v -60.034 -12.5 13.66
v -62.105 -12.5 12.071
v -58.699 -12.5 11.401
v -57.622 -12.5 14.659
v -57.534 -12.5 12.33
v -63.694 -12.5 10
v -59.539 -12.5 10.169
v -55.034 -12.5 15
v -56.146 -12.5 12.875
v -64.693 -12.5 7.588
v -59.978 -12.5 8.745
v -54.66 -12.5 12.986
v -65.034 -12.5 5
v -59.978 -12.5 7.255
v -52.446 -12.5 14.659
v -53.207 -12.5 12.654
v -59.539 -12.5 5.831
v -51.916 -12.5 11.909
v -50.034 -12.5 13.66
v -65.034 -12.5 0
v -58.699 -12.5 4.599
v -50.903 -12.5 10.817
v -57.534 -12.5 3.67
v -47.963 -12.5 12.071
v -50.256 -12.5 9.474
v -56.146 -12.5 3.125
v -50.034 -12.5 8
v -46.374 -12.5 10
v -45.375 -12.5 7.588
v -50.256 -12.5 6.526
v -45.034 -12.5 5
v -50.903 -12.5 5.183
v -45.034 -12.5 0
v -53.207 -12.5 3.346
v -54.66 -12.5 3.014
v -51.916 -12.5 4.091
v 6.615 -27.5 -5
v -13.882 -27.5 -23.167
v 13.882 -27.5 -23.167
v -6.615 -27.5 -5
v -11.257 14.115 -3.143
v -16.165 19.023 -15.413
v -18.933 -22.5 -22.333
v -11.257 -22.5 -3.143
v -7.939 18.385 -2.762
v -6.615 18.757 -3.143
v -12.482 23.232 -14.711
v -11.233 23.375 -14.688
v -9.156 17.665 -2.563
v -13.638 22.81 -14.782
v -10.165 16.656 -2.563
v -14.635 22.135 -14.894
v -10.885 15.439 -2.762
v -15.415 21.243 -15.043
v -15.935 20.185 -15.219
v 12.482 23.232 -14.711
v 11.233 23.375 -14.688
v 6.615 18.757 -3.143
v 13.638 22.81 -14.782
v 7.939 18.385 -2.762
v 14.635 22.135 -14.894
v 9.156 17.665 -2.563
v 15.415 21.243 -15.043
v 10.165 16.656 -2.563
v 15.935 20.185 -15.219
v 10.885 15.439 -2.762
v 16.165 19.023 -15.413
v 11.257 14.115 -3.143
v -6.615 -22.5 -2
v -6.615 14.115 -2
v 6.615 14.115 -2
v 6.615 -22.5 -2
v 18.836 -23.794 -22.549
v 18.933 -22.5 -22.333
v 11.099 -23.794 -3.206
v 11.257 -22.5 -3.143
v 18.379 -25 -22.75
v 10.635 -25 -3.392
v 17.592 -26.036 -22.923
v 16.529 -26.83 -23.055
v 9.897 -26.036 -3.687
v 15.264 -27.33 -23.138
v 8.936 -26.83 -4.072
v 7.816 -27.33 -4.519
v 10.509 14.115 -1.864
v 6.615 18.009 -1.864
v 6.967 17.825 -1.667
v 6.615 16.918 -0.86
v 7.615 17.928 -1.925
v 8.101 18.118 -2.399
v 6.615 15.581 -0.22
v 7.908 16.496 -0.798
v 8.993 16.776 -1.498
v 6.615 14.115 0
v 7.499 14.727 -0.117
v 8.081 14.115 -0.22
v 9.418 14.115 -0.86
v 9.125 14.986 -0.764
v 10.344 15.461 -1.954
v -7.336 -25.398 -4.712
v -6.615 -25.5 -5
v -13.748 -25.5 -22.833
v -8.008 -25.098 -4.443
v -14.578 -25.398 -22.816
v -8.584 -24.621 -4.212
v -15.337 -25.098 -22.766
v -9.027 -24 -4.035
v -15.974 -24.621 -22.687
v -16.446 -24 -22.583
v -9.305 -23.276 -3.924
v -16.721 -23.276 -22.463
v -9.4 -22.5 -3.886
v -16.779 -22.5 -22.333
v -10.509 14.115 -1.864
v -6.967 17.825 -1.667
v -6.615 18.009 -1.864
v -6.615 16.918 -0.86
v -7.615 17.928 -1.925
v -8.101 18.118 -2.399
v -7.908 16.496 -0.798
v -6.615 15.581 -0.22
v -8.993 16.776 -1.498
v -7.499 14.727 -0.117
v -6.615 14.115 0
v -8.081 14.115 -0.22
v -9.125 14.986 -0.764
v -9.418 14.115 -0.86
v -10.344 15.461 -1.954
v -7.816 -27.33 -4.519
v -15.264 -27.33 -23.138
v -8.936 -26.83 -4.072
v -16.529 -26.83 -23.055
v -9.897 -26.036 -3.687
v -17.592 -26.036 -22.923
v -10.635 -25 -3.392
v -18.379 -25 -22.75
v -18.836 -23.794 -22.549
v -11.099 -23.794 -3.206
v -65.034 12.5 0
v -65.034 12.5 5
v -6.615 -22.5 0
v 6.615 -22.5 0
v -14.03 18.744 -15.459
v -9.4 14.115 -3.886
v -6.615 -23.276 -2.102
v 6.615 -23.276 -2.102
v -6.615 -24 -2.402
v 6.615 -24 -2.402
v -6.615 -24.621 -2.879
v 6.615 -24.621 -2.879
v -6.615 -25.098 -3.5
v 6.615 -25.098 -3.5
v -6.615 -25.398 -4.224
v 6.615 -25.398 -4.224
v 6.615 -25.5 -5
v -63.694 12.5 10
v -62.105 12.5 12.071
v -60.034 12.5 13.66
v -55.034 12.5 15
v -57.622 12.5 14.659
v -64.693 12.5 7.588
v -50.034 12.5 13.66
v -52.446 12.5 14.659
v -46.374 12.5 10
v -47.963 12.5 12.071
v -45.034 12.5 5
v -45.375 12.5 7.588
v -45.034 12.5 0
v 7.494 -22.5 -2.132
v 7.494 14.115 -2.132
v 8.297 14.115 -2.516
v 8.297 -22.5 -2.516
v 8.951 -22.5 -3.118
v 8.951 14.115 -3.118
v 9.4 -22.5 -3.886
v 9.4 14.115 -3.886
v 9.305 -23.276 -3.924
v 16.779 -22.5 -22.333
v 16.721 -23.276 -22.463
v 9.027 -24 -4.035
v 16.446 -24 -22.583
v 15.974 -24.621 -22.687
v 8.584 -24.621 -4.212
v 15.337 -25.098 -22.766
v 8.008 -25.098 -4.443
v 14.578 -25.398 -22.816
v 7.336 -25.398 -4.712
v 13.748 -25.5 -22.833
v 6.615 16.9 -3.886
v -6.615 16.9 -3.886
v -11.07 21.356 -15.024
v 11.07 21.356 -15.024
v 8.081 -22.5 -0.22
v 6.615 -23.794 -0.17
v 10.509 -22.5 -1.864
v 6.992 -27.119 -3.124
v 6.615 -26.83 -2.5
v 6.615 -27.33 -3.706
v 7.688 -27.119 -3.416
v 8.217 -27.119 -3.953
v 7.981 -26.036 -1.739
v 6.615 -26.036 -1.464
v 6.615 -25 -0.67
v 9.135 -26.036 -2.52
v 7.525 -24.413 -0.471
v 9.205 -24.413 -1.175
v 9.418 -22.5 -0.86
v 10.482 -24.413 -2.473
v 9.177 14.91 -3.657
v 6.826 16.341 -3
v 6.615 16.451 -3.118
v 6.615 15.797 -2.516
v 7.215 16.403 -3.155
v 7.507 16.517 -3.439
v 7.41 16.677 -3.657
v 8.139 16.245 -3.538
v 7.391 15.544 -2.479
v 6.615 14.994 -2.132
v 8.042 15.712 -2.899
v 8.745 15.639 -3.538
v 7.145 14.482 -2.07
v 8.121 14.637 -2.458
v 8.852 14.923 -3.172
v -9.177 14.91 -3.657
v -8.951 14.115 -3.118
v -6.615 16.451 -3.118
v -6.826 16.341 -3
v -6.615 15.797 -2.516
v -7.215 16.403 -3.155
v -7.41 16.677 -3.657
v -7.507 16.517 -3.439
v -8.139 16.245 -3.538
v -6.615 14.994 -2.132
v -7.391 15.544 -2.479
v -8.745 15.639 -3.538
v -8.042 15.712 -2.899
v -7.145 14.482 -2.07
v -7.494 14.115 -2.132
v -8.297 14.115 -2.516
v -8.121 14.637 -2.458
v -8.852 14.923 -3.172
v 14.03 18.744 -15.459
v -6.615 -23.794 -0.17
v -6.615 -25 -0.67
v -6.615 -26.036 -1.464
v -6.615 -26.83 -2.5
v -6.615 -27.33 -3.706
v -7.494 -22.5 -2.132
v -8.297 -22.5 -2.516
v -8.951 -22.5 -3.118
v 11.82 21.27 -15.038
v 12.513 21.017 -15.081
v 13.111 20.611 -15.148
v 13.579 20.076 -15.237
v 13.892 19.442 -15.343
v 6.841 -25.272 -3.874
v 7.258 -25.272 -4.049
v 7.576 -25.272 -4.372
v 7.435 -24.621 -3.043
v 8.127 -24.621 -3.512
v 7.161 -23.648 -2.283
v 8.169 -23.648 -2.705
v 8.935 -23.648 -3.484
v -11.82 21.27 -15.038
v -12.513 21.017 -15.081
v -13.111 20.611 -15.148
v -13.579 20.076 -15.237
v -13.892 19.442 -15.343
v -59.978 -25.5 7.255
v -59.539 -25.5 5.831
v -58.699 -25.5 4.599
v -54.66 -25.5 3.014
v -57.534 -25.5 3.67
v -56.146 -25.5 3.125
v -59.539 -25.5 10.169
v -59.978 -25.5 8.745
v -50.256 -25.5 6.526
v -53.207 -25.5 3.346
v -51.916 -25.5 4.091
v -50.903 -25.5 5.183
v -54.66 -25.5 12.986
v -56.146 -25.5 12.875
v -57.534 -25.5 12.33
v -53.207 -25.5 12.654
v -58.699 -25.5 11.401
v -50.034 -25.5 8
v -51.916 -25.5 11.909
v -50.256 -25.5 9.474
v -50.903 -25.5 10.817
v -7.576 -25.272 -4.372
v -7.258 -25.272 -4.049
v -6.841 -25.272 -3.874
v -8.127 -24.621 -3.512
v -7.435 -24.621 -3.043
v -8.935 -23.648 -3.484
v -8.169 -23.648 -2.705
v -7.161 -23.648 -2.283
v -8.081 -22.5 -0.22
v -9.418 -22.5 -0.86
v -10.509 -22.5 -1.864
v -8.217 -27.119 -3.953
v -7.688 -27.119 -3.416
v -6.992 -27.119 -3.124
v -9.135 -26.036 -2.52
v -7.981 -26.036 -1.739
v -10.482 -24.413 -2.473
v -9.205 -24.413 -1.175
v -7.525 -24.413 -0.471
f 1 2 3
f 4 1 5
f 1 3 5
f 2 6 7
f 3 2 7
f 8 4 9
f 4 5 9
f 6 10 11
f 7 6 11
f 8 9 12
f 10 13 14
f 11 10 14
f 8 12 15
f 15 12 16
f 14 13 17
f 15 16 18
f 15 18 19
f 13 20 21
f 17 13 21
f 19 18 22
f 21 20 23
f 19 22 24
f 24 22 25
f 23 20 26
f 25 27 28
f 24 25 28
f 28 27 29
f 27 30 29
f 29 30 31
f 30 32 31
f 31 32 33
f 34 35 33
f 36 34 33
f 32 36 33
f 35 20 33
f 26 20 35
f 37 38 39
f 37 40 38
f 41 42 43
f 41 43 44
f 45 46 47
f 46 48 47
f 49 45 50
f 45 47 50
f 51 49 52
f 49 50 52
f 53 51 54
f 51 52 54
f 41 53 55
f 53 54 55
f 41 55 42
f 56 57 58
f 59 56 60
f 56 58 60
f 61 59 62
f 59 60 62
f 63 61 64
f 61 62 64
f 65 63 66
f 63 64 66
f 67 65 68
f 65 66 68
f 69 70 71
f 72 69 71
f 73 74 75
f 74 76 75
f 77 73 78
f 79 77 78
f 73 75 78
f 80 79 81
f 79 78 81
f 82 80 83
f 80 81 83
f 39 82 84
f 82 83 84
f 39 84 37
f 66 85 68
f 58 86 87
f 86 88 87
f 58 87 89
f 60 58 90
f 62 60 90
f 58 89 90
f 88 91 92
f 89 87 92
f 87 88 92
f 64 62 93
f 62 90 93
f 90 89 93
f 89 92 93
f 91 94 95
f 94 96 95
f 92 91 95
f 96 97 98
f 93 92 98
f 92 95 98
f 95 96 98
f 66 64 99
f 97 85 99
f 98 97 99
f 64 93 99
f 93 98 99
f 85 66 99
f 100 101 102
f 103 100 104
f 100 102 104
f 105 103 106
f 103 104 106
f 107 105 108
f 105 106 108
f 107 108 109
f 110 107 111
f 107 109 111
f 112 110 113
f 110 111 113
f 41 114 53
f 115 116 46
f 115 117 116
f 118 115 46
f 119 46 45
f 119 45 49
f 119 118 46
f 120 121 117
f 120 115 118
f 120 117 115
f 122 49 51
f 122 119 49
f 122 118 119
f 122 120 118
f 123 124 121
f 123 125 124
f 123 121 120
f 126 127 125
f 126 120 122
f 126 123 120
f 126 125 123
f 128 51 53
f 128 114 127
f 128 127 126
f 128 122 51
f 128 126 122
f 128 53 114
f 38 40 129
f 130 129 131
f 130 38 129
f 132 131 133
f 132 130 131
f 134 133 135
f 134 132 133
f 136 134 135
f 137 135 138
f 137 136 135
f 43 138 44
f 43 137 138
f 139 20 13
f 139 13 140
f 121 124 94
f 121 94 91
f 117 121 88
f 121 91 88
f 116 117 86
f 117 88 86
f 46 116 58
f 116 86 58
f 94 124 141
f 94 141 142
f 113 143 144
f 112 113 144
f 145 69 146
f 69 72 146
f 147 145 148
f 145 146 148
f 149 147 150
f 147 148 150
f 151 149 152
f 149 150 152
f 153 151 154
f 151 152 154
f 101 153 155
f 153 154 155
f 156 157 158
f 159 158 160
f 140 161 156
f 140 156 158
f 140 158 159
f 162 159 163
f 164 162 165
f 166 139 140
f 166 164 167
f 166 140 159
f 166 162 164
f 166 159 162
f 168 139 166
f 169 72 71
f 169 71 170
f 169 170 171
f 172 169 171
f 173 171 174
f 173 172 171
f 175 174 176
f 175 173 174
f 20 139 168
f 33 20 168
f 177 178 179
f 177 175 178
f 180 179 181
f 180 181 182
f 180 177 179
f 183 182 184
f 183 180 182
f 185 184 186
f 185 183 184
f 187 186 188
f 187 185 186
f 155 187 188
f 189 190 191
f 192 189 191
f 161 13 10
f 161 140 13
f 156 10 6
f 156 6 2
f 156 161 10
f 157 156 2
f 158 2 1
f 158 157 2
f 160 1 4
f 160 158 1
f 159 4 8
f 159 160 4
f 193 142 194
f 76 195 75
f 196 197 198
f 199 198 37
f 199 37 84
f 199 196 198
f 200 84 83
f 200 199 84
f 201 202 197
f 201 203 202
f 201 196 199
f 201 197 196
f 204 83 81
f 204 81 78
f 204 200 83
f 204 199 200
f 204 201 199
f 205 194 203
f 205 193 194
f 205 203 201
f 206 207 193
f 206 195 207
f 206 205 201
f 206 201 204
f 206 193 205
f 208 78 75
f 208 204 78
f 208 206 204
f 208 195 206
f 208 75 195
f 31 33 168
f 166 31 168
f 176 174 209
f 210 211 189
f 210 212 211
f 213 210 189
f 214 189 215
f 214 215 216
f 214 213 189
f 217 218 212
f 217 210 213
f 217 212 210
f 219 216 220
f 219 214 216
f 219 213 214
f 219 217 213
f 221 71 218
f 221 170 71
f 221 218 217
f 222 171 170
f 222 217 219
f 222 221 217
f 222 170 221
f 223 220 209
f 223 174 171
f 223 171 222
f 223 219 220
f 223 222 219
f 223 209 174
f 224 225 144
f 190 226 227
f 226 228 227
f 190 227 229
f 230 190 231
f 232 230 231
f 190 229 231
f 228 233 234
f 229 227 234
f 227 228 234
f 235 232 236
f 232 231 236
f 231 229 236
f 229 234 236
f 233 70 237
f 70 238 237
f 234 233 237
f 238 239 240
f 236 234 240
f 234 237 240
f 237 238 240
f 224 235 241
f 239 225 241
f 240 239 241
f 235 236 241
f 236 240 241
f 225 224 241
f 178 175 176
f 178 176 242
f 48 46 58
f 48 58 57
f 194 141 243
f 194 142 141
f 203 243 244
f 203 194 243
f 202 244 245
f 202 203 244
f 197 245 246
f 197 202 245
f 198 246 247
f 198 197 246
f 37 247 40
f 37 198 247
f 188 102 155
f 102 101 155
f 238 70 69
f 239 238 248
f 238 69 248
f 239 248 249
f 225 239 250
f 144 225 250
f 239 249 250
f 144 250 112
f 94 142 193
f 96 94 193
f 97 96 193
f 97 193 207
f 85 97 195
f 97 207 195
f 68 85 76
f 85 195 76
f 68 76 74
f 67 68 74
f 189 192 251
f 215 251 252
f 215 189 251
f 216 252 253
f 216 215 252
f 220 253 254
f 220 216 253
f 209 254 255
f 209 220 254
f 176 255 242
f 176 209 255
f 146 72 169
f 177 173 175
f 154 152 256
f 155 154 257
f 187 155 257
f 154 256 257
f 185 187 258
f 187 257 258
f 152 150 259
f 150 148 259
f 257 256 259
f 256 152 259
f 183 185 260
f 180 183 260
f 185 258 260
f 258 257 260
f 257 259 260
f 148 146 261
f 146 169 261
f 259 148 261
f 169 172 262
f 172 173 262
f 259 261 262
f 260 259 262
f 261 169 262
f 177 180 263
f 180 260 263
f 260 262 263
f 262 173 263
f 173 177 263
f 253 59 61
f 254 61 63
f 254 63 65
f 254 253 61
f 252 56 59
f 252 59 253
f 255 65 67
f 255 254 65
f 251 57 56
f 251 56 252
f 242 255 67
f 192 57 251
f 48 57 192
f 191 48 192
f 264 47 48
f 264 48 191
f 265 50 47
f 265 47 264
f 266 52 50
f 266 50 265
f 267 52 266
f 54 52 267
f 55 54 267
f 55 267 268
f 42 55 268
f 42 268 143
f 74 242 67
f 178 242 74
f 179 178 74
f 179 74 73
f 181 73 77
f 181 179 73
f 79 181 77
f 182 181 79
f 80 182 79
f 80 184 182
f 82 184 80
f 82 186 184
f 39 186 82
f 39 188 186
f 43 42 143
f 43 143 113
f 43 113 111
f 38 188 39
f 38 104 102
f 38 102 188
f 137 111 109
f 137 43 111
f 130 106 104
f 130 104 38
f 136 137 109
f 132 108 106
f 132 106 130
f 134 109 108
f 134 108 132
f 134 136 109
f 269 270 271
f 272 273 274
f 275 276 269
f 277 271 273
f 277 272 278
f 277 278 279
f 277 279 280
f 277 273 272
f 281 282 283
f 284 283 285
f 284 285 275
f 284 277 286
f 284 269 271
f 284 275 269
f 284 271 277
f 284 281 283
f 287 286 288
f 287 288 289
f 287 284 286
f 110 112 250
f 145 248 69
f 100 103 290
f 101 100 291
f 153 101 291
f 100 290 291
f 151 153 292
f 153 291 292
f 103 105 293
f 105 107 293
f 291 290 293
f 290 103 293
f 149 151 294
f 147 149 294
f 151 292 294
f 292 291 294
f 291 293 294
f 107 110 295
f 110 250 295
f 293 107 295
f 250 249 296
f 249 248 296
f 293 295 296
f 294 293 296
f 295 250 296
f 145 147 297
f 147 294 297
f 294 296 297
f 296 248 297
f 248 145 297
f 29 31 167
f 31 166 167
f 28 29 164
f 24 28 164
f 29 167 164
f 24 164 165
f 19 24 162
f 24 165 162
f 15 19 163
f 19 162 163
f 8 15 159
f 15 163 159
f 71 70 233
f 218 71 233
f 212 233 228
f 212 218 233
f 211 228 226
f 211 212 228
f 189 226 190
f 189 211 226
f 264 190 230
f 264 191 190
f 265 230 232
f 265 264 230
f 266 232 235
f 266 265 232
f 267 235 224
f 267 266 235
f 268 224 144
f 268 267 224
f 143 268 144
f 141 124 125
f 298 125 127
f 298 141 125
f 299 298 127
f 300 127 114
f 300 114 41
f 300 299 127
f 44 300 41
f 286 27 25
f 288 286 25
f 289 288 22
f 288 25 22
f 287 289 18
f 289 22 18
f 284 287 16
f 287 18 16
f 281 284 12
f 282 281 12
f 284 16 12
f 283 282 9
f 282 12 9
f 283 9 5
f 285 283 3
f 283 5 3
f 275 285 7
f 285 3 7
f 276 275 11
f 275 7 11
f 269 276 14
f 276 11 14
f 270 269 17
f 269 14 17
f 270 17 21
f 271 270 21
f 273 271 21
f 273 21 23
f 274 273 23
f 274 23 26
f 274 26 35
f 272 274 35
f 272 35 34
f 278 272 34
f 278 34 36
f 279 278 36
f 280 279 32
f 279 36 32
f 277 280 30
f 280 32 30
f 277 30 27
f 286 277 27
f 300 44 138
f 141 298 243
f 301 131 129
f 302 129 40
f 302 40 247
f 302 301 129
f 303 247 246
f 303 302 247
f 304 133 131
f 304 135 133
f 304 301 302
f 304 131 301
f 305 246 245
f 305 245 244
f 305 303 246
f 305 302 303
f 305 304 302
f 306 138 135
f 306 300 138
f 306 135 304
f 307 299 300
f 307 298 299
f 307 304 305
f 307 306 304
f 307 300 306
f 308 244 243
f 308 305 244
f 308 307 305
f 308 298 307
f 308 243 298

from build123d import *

# Parameters (mm, degrees)
F0_W        = 40
F0_H        = 55
F1_DEPTH    = 25
F2_T1_DEPTH = 383.0272640249
F3_T1_DEPTH = 184.6556819565
F3_T3_DEPTH = 169.6556819565
F4_R        = 5
F5_T        = -2
F0_W_2      = 20
F0_H_2      = 25
F6_DEPTH    = 15
F7_R        = 9.99999
F8_R        = 5
F9_DEPTH    = 13


# Not quite as in the source:
# - a fillet or chamfer that OpenCascade refuses, or shapes differently, is made with other operations: its cross-section is extruded or revolved along the edge and cut away or added
# - a fillet or chamfer is up to 0.001 mm smaller than in the source, because OpenCascade refuses the exact size


with BuildPart() as f1:
    # F0 (on Top) → F1 (new body)
    with BuildSketch(Plane.XY):
        Rectangle(F0_W, F0_H)
    extrude(amount=-F1_DEPTH)

    # F2: chamfer of 11 x 66 on 1 edges, made by hand

    # F2_s2 → F2_t1 (cut)
    with BuildSketch(Plane.YZ.offset(-191.5136320125)):
        Polygon((27.5, -14), (-38.5, -25), (27.5, -25), align=None)
    extrude(amount=F2_T1_DEPTH, mode=Mode.SUBTRACT)

    # F3: chamfer of 10 x 25 on 3 edges, made by hand

    # F3_s2 → F3_t1 (cut)
    with BuildSketch(Plane.XZ.offset(-92.3278409783)):
        Polygon((10, 0), (20, -25), (20, 0), align=None)
        Polygon((-20, -25), (-10, 0), (-20, 0), align=None)
    extrude(amount=F3_T1_DEPTH, mode=Mode.SUBTRACT)

    # F3_s4 → F3_t3 (cut)
    with BuildSketch(Plane.YZ.offset(-84.8278409783)):
        Polygon((17.5, 0), (27.5, -25), (27.5, 0), align=None)
    extrude(amount=F3_T3_DEPTH, mode=Mode.SUBTRACT)

    # F4
    f4_edges = [f1.edges().sort_by_distance(p)[0] for p in [
        (10, -5, 0),
        (0, -27.5, 0),
        (-10, -5, 0),
        (0, 17.5, 0),
        (-12.9375, 20.4375, -7.34375),
        (12.9375, 20.4375, -7.34375),
        (-14.633333, -27.5, -11.583333),
        (14.633333, -27.5, -11.583333),
    ]]
    fillet(f4_edges, radius=F4_R)

    # F5
    f5_openings = [f1.faces().sort_by_distance(p)[0] for p in [
        (0, -2.846063, -19.057677),
    ]]
    offset(amount=F5_T, openings=f5_openings)


with BuildPart() as f6:
    # F0 (on Top) → F6 (new body)
    with BuildSketch(Plane.XY):
        with Locations((-55.0338290632, 0)):
            Rectangle(F0_W_2, F0_H_2)
    extrude(amount=F6_DEPTH)

    # F7 (radius 10 in the source; OpenCascade refuses exactly that, so slightly less here)
    f7_edges = [f6.edges().sort_by_distance(p)[0] for p in [
        (-45.033829, 0, 15),
        (-65.033829, 0, 15),
    ]]
    fillet(f7_edges, radius=F7_R)

    # F8 (on face) → F9 (join)
    with BuildSketch(Plane.XZ.offset(12.5)):
        with Locations((-55.0338290632, 8)):
            Circle(F8_R)
    extrude(amount=F9_DEPTH)


solid = Compound([f1.part, f6.part])
